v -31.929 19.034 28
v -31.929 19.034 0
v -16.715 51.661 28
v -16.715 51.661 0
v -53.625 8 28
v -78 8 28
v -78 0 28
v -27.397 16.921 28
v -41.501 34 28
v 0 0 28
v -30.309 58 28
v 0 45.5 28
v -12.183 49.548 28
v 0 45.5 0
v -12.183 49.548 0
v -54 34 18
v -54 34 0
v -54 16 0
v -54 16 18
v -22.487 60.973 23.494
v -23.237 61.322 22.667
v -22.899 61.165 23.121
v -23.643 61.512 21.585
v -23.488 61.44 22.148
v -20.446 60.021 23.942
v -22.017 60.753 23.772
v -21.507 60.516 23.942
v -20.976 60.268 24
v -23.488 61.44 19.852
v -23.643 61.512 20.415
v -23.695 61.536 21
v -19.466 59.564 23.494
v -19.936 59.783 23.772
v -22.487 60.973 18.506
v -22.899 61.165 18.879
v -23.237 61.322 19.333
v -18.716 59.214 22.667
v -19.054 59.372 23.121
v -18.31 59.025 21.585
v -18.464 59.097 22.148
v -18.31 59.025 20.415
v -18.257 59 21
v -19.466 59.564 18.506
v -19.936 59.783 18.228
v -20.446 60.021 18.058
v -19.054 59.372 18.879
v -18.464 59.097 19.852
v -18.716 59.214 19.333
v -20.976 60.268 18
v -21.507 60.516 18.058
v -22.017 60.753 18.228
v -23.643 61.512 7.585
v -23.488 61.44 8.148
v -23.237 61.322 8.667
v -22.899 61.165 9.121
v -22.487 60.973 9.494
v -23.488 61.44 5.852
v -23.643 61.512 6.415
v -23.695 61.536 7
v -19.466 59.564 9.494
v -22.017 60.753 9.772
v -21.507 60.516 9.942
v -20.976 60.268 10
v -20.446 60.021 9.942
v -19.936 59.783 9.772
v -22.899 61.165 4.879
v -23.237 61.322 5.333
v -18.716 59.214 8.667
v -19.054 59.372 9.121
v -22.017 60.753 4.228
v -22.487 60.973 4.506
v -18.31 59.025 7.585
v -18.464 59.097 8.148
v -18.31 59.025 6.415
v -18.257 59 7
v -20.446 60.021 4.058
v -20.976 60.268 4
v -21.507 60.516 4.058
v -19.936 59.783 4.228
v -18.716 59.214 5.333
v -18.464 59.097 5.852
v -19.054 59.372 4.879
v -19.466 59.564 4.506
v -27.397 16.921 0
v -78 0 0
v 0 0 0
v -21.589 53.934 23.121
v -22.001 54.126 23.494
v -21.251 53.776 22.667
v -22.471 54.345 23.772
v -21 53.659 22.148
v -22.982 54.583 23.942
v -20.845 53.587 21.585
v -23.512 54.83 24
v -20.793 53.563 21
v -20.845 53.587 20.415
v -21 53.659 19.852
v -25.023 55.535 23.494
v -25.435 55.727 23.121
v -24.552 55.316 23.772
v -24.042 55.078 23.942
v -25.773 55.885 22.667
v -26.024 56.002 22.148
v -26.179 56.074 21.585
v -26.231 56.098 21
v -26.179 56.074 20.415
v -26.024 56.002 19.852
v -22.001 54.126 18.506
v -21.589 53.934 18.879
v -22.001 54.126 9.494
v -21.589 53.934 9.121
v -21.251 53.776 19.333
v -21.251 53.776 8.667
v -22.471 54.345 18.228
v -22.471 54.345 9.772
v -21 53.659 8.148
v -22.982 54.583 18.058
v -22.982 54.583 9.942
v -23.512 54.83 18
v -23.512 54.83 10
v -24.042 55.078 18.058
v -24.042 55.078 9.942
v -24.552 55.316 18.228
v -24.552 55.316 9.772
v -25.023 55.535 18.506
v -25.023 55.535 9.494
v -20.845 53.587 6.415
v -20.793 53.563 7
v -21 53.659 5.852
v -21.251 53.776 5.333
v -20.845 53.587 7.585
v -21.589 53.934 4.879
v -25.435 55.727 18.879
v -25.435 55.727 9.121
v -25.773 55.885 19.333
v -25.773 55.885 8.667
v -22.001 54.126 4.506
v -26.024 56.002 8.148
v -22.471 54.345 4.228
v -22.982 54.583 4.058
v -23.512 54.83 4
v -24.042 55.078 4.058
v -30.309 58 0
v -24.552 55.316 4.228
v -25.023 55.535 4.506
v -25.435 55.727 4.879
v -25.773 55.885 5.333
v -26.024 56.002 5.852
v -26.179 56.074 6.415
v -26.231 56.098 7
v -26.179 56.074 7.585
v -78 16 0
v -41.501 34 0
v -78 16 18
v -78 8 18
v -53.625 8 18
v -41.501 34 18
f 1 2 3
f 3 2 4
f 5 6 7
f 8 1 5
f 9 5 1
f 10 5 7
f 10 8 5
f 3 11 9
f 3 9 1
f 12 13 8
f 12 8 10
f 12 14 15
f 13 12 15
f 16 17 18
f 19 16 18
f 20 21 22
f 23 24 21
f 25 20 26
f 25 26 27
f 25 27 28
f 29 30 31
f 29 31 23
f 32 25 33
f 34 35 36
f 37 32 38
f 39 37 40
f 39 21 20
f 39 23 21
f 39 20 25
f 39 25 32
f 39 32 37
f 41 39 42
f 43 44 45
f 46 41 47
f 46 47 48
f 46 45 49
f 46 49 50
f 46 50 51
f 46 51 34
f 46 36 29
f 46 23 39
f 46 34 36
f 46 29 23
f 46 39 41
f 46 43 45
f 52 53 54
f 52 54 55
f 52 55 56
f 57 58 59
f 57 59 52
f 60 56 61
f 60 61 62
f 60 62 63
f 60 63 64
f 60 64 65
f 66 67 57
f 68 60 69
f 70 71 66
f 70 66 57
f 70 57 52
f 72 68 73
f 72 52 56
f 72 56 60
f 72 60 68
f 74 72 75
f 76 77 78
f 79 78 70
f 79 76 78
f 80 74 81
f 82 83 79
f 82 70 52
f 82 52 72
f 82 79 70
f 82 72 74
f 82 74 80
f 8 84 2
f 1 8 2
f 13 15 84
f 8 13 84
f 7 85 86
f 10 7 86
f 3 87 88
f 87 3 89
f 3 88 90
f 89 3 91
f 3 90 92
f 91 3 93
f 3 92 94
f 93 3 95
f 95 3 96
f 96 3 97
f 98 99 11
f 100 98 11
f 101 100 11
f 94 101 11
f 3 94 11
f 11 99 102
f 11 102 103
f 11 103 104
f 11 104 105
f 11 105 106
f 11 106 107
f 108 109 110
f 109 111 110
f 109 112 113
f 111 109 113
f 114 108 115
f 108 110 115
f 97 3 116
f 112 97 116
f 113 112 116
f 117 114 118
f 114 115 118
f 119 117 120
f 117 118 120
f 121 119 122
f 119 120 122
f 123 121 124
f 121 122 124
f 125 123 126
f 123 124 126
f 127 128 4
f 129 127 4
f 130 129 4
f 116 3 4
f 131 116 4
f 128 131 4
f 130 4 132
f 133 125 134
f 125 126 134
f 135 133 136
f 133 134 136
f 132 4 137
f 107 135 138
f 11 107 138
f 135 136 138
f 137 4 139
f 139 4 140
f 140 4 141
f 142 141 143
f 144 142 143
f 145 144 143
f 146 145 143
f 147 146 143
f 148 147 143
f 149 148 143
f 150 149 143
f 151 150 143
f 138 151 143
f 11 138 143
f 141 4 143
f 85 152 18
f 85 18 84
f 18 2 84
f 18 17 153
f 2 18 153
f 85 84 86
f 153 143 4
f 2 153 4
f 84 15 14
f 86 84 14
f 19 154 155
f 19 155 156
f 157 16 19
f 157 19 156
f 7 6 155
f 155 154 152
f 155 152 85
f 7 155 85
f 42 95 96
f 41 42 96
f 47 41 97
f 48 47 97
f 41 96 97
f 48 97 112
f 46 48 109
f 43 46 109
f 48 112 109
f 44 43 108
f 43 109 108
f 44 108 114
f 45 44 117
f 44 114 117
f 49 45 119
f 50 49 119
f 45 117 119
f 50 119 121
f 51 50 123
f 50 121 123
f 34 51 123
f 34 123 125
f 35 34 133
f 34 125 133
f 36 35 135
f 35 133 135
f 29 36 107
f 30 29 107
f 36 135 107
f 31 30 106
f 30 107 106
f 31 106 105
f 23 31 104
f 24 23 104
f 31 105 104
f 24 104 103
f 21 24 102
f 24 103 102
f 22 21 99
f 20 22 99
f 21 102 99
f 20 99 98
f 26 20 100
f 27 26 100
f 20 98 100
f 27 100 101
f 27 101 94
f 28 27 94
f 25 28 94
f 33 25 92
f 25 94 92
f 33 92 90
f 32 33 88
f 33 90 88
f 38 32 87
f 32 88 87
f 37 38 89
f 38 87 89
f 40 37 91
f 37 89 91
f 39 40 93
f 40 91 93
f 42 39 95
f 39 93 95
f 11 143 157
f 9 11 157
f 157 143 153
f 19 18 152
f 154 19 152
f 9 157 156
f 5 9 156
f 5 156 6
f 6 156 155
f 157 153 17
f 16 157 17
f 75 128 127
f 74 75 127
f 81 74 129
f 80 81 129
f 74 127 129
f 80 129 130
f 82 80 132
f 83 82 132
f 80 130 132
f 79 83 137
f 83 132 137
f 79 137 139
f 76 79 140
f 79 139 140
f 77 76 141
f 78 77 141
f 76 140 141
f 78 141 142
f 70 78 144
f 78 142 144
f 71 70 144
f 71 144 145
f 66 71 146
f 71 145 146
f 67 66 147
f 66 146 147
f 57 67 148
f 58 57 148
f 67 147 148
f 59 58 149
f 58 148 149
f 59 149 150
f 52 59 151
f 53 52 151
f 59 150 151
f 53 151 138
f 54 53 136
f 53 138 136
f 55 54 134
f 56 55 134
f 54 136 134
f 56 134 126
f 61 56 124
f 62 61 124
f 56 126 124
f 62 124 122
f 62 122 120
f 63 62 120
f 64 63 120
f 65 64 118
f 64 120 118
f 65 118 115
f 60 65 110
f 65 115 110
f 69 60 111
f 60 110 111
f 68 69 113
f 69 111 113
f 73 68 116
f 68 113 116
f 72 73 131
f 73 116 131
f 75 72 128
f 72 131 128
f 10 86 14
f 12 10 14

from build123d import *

# Parameters (mm, degrees)
BOSS_EXTRUDE1_DEPTH = 28
BOSS_EXTRUDE2_DEPTH = 18
SKETCH4_R           = 3
BOSS_EXTRUDE3_DEPTH = 6


with BuildPart() as part:
    # Sketch1 → Boss-Extrude1 (new body)
    with BuildSketch(Plane.XY):
        Polygon((-78, 0), (0, 0), (0, 45.5), (-12.183101538, 49.547634765), (-27.397358961, 16.920554432), (-31.928897896, 19.033645741), (-16.714640473, 51.660726074), (-30.309257279, 58), (-41.500641075, 34), (-53.624640187, 8), (-78, 8), align=None)
    extrude(amount=BOSS_EXTRUDE1_DEPTH)

    # Sketch1<4> → Boss-Extrude2 (add)
    with BuildSketch(Plane.XY):
        Polygon((-78, 16), (-78, 8), (-53.624640187, 8), (-41.500641075, 34), (-54, 34), (-54, 16), align=None)
    extrude(amount=BOSS_EXTRUDE2_DEPTH)

    # Sketch4 → Boss-Extrude3 (add)
    with BuildSketch(Plane(origin=(16.80186773, 36.031721624, 0), x_dir=(0.9063077870366462, -0.4226182617407076, 0), z_dir=(0.4226182617407076, 0.9063077870366462, 0))):
        with Locations((-44.481375072, -21)):
            Circle(SKETCH4_R)
        with Locations((-44.481375072, -7)):
            Circle(SKETCH4_R)
    extrude(amount=BOSS_EXTRUDE3_DEPTH)


solid = part.part
